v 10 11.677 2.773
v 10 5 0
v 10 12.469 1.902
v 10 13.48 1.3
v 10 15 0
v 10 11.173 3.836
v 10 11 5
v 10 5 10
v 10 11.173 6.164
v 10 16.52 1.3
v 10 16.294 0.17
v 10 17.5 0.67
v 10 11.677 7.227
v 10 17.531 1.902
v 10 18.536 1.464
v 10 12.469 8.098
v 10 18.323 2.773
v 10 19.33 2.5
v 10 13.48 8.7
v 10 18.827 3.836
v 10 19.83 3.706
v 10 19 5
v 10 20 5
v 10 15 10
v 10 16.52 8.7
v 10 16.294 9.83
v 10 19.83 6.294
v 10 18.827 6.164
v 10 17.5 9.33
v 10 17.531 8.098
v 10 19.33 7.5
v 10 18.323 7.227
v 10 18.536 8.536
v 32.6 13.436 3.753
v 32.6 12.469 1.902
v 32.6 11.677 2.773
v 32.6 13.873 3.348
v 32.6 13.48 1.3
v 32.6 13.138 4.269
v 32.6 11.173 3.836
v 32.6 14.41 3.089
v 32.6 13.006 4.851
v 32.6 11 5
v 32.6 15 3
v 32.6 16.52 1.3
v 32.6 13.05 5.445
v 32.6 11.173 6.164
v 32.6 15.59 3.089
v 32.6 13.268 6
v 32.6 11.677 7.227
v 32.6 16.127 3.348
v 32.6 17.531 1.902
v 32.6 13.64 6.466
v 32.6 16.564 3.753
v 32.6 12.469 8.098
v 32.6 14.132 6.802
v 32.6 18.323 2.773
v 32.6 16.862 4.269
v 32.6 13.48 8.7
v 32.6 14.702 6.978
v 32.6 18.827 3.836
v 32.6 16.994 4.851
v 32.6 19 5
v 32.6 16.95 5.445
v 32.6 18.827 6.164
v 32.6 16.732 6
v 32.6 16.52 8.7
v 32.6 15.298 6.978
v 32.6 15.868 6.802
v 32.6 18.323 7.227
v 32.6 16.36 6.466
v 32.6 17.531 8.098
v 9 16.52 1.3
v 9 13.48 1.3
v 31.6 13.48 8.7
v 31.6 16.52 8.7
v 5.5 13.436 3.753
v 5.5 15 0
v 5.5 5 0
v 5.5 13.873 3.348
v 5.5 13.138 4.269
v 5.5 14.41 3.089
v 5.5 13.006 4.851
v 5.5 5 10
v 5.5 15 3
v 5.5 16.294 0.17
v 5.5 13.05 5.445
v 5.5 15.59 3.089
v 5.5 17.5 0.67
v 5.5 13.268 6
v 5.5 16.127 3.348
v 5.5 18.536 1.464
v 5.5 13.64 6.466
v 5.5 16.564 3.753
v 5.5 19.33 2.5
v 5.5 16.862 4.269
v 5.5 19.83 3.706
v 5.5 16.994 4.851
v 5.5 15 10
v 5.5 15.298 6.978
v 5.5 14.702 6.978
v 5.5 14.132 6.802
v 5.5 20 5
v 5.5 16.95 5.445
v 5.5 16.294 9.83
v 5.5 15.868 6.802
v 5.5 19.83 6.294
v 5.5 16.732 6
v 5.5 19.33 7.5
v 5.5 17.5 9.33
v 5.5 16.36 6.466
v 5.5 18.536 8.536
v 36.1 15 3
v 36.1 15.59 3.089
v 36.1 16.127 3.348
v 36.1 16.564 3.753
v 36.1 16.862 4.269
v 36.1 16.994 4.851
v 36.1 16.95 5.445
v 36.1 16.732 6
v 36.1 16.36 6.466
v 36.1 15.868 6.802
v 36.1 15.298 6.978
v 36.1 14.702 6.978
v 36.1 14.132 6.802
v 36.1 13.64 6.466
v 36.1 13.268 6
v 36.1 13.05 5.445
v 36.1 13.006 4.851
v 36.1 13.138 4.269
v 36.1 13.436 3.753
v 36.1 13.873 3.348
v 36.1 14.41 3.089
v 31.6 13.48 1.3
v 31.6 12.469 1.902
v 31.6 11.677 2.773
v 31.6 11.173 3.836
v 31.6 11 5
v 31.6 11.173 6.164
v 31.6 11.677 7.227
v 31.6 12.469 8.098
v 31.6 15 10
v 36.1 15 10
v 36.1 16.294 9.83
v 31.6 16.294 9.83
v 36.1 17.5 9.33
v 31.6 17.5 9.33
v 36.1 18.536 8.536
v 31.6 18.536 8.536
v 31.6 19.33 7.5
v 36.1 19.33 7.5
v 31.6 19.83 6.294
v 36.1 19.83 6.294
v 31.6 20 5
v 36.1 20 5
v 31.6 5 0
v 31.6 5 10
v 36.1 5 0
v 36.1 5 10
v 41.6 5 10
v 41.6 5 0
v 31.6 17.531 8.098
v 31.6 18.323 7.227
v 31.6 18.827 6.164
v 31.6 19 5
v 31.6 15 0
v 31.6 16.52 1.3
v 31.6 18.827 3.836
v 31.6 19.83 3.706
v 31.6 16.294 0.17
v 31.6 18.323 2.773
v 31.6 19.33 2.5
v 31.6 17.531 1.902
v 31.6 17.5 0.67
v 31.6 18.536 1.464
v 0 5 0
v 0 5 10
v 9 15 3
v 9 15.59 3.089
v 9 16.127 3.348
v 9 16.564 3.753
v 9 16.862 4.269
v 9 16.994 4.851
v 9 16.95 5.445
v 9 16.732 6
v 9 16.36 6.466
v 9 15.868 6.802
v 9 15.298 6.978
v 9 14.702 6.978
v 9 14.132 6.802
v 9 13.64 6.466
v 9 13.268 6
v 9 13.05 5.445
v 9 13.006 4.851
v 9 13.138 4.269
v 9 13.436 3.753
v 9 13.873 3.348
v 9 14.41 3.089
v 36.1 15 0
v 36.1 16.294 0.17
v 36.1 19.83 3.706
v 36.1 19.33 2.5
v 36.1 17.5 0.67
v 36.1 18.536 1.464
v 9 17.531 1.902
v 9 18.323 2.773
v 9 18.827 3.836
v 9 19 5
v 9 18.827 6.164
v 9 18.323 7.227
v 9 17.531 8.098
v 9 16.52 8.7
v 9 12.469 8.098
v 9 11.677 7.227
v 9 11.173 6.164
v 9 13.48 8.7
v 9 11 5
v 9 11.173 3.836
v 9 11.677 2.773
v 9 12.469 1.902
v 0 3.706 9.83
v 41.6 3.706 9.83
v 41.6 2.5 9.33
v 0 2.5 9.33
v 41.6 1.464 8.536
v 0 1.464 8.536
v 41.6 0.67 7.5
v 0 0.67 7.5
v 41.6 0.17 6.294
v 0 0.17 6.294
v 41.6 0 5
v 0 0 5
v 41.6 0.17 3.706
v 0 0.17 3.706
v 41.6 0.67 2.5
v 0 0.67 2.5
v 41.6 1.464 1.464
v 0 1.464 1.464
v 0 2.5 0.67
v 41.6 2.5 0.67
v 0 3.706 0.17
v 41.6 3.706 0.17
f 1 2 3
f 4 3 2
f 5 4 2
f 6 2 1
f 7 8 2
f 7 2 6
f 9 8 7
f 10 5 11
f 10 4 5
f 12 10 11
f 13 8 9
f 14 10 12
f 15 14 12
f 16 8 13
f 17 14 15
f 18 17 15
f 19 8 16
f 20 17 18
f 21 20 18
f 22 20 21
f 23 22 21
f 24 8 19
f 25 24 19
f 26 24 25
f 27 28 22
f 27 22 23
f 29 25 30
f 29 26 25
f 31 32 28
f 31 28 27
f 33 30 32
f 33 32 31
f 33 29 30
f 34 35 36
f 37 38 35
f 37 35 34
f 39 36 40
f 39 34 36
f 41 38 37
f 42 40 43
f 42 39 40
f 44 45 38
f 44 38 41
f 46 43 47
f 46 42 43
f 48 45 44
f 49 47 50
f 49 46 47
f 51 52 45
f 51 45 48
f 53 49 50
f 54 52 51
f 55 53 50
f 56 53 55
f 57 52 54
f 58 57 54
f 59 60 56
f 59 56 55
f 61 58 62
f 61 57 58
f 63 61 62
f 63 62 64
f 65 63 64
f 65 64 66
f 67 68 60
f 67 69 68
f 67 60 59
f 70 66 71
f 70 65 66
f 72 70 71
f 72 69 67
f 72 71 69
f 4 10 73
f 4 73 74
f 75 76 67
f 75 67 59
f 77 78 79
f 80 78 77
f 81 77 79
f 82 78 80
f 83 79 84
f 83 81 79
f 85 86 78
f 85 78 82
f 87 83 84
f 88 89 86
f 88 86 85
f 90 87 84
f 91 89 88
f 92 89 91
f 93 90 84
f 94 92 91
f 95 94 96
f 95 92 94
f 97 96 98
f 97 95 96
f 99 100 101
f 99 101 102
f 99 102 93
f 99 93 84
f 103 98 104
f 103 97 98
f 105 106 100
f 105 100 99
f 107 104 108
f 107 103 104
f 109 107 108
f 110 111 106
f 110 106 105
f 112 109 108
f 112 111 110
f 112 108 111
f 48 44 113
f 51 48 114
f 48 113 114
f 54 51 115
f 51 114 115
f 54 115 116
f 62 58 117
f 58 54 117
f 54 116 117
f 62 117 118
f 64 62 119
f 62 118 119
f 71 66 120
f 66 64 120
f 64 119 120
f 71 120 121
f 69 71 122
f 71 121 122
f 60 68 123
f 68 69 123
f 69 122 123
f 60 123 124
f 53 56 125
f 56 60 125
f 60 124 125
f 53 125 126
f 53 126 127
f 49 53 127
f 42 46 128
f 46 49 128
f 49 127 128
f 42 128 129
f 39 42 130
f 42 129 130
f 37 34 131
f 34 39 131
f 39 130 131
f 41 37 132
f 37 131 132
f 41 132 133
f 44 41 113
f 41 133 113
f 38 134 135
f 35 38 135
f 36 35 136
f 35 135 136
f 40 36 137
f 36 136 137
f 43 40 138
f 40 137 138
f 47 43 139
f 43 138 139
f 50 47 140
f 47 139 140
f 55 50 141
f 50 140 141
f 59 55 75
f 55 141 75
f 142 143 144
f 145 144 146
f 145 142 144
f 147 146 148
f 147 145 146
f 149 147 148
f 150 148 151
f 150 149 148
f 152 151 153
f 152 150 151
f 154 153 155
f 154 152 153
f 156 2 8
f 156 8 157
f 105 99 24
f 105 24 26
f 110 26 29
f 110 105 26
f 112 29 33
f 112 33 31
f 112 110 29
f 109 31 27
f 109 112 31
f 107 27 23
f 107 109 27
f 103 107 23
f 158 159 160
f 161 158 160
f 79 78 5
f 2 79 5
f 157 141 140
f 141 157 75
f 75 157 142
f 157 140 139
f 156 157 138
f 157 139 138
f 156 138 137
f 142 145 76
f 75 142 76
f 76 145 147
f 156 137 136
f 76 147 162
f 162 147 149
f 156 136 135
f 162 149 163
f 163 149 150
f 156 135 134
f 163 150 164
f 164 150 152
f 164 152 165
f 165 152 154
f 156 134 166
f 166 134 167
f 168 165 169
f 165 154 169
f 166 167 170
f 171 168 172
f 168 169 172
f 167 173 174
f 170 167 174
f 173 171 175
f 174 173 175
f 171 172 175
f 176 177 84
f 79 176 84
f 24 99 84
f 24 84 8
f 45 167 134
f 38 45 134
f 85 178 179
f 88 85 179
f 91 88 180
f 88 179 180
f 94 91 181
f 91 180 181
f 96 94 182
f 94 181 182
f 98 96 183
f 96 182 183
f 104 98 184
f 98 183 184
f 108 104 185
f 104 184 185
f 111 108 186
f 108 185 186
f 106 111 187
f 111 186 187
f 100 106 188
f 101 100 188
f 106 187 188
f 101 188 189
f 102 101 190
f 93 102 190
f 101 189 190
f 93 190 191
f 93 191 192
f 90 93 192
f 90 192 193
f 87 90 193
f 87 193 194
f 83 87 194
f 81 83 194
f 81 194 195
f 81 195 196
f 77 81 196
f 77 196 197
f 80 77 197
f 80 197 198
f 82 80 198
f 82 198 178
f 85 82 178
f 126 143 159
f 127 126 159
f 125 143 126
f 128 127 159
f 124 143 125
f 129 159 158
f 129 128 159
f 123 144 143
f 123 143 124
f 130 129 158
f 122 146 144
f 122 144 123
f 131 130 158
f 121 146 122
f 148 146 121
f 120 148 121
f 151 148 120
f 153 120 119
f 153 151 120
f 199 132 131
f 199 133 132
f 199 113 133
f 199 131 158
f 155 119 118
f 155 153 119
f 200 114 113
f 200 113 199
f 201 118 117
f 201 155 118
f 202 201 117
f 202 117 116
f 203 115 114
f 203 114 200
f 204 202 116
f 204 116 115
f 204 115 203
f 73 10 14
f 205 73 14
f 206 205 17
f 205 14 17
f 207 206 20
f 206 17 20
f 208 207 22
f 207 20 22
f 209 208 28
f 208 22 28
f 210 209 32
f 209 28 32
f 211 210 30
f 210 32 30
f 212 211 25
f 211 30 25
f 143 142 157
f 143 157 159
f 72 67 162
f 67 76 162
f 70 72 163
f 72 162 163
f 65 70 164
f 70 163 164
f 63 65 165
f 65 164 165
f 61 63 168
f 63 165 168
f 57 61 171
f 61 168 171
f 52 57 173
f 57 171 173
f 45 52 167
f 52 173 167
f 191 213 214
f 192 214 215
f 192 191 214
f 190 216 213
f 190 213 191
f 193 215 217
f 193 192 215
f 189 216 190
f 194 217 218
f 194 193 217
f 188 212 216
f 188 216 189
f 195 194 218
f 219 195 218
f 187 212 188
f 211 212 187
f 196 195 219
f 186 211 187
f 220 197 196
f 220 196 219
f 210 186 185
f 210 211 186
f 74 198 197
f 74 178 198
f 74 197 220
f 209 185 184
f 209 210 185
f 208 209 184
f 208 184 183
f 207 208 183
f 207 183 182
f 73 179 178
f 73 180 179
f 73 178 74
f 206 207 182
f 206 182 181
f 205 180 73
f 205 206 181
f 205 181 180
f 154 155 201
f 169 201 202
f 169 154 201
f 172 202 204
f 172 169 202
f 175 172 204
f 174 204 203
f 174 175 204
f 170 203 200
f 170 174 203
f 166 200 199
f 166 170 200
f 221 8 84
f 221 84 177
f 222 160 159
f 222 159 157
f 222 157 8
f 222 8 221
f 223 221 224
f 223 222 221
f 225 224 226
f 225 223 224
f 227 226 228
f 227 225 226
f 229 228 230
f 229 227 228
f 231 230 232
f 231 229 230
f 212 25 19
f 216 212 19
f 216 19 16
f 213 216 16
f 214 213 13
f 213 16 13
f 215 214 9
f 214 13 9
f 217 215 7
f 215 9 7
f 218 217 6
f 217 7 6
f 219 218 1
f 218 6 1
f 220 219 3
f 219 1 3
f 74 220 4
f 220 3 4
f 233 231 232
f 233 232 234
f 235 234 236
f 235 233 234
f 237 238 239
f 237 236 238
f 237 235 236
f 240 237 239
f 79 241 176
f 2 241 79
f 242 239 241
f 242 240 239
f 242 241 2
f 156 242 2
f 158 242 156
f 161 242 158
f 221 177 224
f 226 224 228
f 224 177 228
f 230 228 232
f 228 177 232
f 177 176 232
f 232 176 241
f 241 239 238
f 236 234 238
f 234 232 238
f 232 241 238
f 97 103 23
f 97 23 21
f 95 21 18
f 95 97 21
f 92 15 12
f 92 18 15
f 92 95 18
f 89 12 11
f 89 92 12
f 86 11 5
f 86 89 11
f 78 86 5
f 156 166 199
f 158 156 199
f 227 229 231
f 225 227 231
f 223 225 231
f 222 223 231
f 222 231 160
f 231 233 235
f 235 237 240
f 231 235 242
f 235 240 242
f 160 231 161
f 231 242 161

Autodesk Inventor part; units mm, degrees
ref_plane "YZ Plane" through (0, 0, 0) normal (1, 0, 0) x (0, 1, 0)
ref_plane "XZ Plane" through (0, 0, 0) normal (0, 1, 0) x (-1, 0, 0)
ref_plane "XY Plane" through (0, 0, 0) normal (0, 0, 1) x (1, 0, 0)
sketch "Sketch1" plane through (0, 0, 0) normal (0, 0, 1) x (1, 0, 0)
  line L0 (0, 0) -> (41.6, 0)
  line L1 (41.6, 0) -> (41.6, 20)
  line L2 (41.6, 20) -> (0, 20)
  line L3 (0, 20) -> (0, 0)
  dimension "d0" = 41.6
  dimension "d1" = 20
extrude "Extrusion1" add sketch "Sketch1" along normal blind 10
sketch "Sketch3" plane through (0, 0, 10) normal (0, 0, 1) x (1, 0, 0)
  line L0 (0, 20) -> (5, 20)
  line L1 (5, 20) -> (5, 10)
  line L2 (5, 10) -> (0, 10)
  line L3 (0, 10) -> (0, 20)
  line L4 (41.6, 20) -> (36.6, 20)
  line L5 (36.6, 20) -> (36.6, 10)
  line L6 (36.6, 10) -> (41.6, 10)
  line L7 (41.6, 10) -> (41.6, 20)
  dimension "d7" = 5
  dimension "d8" = 5
  dimension "d9" = 10
extrude "Extrusion2" cut sketch "Sketch3" against normal through all
sketch "Sketch4" plane through (0, 0, 10) normal (0, 0, 1) x (1, 0, 0)
  line L0 (36.6, 20) -> (5, 20) projected
  line L1 (5, 20) -> (5, 10) projected
  line L2 (10, 20) -> (31.6, 20)
  line L3 (31.6, 20) -> (31.6, 10)
  line L4 (31.6, 10) -> (10, 10)
  line L5 (10, 10) -> (10, 20)
  dimension "d12" = 21.6
  dimension "d13" = 10
  dimension "d14" = 5
extrude "Extrusion3" cut sketch "Sketch4" against normal through all
fillet "Fillet1" radius 5 6 edges at (20.8, 0, 0) (20.8, 0, 10) (34.1, 20, 10) (34.1, 20, 0) (7.5, 20, 0) (7.5, 20, 10)
sketch "Sketch5" plane through (10, 10, 10) normal (0, 1, 0) x (1, 0, 0)
  line L0 (0, 10) -> (21.6, 10) projected
  line L1 (0, 0) -> (0, 10) projected
  line L2 (21.6, 0) -> (0, 0) projected
  line L3 (21.6, 0) -> (21.6, 10) projected
  point P0 (-10, 10)
extrude "Extrusion4" cut sketch "Sketch5" against normal blind 5
sketch "Sketch6" plane through (36.6, 10, 10) normal (0, 1, 0) x (1, 0, 0)
  line L0 (0, 10) -> (5, 10) projected
  line L1 (0, 0) -> (0, 10) projected
  line L2 (5, 0) -> (0, 0) projected
  line L3 (5, 10) -> (5, 0) projected
  point P0 (-36.6, 10)
extrude "Extrusion5" cut sketch "Sketch6" against normal blind 5
sketch "Sketch7" plane through (0, 10, 10) normal (0, 1, 0) x (1, 0, 0)
  line L0 (0, 10) -> (5, 10) projected
  line L1 (0, 0) -> (0, 10) projected
  line L2 (5, 0) -> (0, 0) projected
  line L3 (5, 0) -> (5, 10) projected
extrude "Extrusion6" cut sketch "Sketch7" against normal blind 5
sketch "Sketch8" plane through (5, 15, 5) normal (-1, 0, 0) x (0, 0, 1)
  arc A0 (5, 0) -> (-5, 0) centre (0, 0) ccw projected
  line L0 (-5, -10) -> (-5, 0) projected
  line L1 (-5, -10) -> (5, -10) projected
  line L2 (5, 0) -> (5, -10) projected
  point P0 (-5, -15)
extrude "Extrusion7" cut sketch "Sketch8" against normal blind 0.5
sketch "Sketch9" plane through (36.6, 15, 5) normal (1, 0, 0) x (0, 0, -1)
  arc A0 (5, 0) -> (-5, 0) centre (0, 0) ccw projected
  line L0 (-5, -10) -> (-5, 0) projected
  line L1 (-5, -10) -> (5, -10) projected
  line L2 (5, 0) -> (5, -10) projected
  point P0 (5, -15)
extrude "Extrusion8" cut sketch "Sketch9" against normal blind 0.5
sketch "Sketch10" plane through (36.1, 15, 5) normal (1, 0, 0) x (0, 0, -1)
  arc A0 (5, 0) -> (-5, 0) centre (0, 0) ccw projected
  circle A1 centre (0, 0) radius 2
  point P0 (5, -15)
  dimension "d28" = 4
extrude "Extrusion9" cut sketch "Sketch10" against normal through all
sketch "Sketch11" plane through (31.6, 15, 5) normal (-1, 0, 0) x (0, 0, 1)
  circle A0 centre (0, 0) radius 2 projected
  arc A1 (5, 0) -> (-5, 0) centre (0, 0) ccw projected
  line L0 (5, 0) -> (5, -10) projected
  line L1 (-3.7, 1.5199) -> (-3.7, -1.5199)
  line L2 (3.7, 1.5199) -> (3.7, -1.5199)
  arc A2 (-3.7, -1.5199) -> (3.7, -1.5199) centre (0, 0) ccw
  arc A3 (3.7, 1.5199) -> (-3.7, 1.5199) centre (0, 0) ccw
  point P0 (-5, -15)
  dimension "d33" = 3.7
extrude "Extrusion10" cut sketch "Sketch11" against normal blind 1
sketch "Sketch12" plane through (10, 15, 5) normal (1, 0, 0) x (0, 0, -1)
  circle A0 centre (0, 0) radius 2 projected
  arc A1 (5, 0) -> (-5, 0) centre (0, 0) ccw projected
  line L0 (5, 0) -> (5, -10) projected
  line L1 (3.7, 1.5199) -> (3.7, -1.5199)
  line L2 (-3.7, 1.5199) -> (-3.7, -1.5199)
  arc A2 (-3.7, -1.5199) -> (3.7, -1.5199) centre (0, 0) ccw
  arc A3 (3.7, 1.5199) -> (-3.7, 1.5199) centre (0, 0) ccw
  point P0 (5, -15)
  dimension "d37" = 3.7
extrude "Extrusion11" cut sketch "Sketch12" against normal blind 1
properties part number "Sliide"
